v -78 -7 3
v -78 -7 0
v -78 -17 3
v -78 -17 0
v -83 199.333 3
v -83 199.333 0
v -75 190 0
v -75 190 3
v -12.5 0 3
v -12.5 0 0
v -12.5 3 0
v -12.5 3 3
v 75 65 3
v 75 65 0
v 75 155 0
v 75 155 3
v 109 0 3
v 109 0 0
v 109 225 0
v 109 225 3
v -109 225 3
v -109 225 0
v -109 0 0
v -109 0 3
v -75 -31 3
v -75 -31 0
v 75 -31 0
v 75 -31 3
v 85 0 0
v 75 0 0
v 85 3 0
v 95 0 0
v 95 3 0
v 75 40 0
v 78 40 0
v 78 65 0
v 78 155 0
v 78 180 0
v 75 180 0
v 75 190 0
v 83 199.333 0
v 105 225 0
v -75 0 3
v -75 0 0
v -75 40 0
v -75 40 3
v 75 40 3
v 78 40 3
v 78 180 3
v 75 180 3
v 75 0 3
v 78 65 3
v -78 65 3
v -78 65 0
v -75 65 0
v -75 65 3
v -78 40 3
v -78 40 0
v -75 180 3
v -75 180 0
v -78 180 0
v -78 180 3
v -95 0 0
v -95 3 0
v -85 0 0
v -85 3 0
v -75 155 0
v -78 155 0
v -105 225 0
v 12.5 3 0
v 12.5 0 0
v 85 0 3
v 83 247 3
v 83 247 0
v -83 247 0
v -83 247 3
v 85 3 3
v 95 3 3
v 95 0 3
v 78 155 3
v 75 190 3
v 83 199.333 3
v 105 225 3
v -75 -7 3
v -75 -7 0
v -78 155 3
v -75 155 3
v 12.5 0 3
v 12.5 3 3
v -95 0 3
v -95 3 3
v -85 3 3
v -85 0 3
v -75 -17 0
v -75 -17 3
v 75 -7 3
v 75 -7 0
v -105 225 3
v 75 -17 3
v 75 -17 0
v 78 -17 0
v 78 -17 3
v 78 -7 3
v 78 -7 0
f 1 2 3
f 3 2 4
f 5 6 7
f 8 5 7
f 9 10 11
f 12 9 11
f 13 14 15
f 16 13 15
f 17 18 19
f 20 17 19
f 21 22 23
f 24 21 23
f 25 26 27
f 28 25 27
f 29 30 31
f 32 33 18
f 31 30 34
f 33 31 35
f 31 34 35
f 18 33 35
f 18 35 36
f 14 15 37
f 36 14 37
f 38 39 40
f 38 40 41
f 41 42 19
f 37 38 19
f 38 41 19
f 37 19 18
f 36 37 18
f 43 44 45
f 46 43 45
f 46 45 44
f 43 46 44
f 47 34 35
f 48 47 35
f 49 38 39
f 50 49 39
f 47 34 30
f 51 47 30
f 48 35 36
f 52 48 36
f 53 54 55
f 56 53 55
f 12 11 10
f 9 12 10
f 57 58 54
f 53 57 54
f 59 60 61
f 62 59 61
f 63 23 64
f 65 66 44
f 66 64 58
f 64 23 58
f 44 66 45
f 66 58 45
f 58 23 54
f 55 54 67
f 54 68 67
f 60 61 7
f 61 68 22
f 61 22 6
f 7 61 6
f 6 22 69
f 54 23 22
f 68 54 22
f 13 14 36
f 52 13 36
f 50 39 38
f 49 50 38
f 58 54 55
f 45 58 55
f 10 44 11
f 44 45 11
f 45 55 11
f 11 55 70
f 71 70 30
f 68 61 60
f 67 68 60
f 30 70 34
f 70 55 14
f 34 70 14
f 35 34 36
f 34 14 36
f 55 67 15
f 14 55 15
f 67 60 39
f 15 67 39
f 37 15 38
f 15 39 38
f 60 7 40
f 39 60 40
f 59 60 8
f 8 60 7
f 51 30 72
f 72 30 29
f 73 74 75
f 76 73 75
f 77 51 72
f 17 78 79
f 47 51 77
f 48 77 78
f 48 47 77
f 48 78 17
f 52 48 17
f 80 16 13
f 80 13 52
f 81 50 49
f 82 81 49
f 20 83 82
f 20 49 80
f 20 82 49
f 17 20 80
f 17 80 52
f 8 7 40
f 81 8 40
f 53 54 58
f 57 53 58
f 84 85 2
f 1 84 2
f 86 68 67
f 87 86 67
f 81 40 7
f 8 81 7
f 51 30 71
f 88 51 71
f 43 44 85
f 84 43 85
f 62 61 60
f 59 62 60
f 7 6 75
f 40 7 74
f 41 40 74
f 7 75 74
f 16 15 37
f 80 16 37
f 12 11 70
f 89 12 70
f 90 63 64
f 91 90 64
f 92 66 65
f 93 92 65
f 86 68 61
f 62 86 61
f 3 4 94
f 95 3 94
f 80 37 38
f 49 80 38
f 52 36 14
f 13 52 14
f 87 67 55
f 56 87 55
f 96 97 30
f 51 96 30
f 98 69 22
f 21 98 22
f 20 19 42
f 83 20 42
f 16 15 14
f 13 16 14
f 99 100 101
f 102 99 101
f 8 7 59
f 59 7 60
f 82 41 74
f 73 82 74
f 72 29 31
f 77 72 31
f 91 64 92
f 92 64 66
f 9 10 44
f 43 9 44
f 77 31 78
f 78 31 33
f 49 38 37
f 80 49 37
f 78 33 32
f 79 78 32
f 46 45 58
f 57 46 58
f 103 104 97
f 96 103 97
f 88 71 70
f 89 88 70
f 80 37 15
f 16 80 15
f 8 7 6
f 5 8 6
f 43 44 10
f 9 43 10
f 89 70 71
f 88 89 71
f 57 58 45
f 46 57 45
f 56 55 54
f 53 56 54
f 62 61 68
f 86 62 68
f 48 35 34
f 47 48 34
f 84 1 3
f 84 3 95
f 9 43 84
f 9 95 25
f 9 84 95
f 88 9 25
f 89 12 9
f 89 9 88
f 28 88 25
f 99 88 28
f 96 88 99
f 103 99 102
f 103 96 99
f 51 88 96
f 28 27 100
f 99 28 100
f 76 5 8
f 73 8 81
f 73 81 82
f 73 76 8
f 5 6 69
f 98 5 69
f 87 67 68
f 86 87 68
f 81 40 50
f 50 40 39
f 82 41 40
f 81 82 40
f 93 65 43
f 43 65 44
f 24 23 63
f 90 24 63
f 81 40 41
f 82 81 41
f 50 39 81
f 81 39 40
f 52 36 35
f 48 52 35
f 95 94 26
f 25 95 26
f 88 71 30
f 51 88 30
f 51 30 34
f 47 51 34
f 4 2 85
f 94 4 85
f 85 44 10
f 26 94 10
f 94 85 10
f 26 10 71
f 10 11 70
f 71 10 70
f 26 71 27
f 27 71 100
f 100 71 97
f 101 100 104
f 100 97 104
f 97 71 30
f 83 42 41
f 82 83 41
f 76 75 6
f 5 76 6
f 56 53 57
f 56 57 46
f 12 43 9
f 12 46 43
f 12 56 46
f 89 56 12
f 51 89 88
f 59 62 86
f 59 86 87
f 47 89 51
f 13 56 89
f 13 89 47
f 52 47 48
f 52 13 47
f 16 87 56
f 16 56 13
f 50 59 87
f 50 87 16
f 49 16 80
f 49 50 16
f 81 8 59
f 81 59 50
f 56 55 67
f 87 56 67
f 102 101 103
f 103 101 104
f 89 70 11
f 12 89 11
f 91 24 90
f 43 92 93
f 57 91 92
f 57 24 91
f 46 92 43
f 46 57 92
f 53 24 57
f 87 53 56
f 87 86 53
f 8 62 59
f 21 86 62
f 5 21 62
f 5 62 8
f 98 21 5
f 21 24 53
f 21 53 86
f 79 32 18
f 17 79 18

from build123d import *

# Parameters (mm, degrees)
F1_DEPTH = 3
F2_DEPTH = 3
F3_DEPTH = 3


with BuildPart() as f1:
    # F0 (on Top) → F1 (new body)
    with BuildSketch(Plane.XY):
        Polygon((75, 40), (75, 0), (85, 0), (85, 3), (95, 3), (95, 0), (105, 0), (109, 0), (109, 225), (105, 225), (83, 199.333333), (75, 190), (75, 180), (78, 180), (78, 155), (75, 155), (75, 65), (78, 65), (78, 40), align=None)
        Polygon((-12.5, 3), (-12.5, 0), (-75, 0), (-75, -7), (-78, -7), (-78, -17), (-75, -17), (-75, -31), (0, -31), (75, -31), (75, -17), (78, -17), (78, -7), (75, -7), (75, 0), (12.5, 0), (12.5, 3), (0, 3), align=None)
        Polygon((-85, 0), (-75, 0), (-75, 40), (-78, 40), (-78, 65), (-75, 65), (-75, 155), (-78, 155), (-78, 180), (-75, 180), (-75, 190), (-83, 199.333333), (-105, 225), (-109, 225), (-109, 0), (-105, 0), (-95, 0), (-95, 3), (-85, 3), align=None)
    extrude(amount=F1_DEPTH)


with BuildPart() as f2:
    # F0 (on Top) → F2 (new body)
    with BuildSketch(Plane.XY):
        Polygon((-75, 0), (-12.5, 0), (-12.5, 3), (0, 3), (12.5, 3), (12.5, 0), (75, 0), (75, 40), (78, 40), (78, 65), (75, 65), (75, 155), (78, 155), (78, 180), (75, 180), (75, 190), (0, 190), (-75, 190), (-75, 180), (-78, 180), (-78, 155), (-75, 155), (-75, 65), (-78, 65), (-78, 40), (-75, 40), align=None)
    extrude(amount=F2_DEPTH)


with BuildPart() as f3:
    # F0 (on Top) → F3 (new body)
    with BuildSketch(Plane.XY):
        Polygon((-83, 199.333333), (-75, 190), (0, 190), (75, 190), (83, 199.333333), (83, 247), (-83, 247), align=None)
    extrude(amount=F3_DEPTH)


solid = Compound([f1.part, f2.part, f3.part])
